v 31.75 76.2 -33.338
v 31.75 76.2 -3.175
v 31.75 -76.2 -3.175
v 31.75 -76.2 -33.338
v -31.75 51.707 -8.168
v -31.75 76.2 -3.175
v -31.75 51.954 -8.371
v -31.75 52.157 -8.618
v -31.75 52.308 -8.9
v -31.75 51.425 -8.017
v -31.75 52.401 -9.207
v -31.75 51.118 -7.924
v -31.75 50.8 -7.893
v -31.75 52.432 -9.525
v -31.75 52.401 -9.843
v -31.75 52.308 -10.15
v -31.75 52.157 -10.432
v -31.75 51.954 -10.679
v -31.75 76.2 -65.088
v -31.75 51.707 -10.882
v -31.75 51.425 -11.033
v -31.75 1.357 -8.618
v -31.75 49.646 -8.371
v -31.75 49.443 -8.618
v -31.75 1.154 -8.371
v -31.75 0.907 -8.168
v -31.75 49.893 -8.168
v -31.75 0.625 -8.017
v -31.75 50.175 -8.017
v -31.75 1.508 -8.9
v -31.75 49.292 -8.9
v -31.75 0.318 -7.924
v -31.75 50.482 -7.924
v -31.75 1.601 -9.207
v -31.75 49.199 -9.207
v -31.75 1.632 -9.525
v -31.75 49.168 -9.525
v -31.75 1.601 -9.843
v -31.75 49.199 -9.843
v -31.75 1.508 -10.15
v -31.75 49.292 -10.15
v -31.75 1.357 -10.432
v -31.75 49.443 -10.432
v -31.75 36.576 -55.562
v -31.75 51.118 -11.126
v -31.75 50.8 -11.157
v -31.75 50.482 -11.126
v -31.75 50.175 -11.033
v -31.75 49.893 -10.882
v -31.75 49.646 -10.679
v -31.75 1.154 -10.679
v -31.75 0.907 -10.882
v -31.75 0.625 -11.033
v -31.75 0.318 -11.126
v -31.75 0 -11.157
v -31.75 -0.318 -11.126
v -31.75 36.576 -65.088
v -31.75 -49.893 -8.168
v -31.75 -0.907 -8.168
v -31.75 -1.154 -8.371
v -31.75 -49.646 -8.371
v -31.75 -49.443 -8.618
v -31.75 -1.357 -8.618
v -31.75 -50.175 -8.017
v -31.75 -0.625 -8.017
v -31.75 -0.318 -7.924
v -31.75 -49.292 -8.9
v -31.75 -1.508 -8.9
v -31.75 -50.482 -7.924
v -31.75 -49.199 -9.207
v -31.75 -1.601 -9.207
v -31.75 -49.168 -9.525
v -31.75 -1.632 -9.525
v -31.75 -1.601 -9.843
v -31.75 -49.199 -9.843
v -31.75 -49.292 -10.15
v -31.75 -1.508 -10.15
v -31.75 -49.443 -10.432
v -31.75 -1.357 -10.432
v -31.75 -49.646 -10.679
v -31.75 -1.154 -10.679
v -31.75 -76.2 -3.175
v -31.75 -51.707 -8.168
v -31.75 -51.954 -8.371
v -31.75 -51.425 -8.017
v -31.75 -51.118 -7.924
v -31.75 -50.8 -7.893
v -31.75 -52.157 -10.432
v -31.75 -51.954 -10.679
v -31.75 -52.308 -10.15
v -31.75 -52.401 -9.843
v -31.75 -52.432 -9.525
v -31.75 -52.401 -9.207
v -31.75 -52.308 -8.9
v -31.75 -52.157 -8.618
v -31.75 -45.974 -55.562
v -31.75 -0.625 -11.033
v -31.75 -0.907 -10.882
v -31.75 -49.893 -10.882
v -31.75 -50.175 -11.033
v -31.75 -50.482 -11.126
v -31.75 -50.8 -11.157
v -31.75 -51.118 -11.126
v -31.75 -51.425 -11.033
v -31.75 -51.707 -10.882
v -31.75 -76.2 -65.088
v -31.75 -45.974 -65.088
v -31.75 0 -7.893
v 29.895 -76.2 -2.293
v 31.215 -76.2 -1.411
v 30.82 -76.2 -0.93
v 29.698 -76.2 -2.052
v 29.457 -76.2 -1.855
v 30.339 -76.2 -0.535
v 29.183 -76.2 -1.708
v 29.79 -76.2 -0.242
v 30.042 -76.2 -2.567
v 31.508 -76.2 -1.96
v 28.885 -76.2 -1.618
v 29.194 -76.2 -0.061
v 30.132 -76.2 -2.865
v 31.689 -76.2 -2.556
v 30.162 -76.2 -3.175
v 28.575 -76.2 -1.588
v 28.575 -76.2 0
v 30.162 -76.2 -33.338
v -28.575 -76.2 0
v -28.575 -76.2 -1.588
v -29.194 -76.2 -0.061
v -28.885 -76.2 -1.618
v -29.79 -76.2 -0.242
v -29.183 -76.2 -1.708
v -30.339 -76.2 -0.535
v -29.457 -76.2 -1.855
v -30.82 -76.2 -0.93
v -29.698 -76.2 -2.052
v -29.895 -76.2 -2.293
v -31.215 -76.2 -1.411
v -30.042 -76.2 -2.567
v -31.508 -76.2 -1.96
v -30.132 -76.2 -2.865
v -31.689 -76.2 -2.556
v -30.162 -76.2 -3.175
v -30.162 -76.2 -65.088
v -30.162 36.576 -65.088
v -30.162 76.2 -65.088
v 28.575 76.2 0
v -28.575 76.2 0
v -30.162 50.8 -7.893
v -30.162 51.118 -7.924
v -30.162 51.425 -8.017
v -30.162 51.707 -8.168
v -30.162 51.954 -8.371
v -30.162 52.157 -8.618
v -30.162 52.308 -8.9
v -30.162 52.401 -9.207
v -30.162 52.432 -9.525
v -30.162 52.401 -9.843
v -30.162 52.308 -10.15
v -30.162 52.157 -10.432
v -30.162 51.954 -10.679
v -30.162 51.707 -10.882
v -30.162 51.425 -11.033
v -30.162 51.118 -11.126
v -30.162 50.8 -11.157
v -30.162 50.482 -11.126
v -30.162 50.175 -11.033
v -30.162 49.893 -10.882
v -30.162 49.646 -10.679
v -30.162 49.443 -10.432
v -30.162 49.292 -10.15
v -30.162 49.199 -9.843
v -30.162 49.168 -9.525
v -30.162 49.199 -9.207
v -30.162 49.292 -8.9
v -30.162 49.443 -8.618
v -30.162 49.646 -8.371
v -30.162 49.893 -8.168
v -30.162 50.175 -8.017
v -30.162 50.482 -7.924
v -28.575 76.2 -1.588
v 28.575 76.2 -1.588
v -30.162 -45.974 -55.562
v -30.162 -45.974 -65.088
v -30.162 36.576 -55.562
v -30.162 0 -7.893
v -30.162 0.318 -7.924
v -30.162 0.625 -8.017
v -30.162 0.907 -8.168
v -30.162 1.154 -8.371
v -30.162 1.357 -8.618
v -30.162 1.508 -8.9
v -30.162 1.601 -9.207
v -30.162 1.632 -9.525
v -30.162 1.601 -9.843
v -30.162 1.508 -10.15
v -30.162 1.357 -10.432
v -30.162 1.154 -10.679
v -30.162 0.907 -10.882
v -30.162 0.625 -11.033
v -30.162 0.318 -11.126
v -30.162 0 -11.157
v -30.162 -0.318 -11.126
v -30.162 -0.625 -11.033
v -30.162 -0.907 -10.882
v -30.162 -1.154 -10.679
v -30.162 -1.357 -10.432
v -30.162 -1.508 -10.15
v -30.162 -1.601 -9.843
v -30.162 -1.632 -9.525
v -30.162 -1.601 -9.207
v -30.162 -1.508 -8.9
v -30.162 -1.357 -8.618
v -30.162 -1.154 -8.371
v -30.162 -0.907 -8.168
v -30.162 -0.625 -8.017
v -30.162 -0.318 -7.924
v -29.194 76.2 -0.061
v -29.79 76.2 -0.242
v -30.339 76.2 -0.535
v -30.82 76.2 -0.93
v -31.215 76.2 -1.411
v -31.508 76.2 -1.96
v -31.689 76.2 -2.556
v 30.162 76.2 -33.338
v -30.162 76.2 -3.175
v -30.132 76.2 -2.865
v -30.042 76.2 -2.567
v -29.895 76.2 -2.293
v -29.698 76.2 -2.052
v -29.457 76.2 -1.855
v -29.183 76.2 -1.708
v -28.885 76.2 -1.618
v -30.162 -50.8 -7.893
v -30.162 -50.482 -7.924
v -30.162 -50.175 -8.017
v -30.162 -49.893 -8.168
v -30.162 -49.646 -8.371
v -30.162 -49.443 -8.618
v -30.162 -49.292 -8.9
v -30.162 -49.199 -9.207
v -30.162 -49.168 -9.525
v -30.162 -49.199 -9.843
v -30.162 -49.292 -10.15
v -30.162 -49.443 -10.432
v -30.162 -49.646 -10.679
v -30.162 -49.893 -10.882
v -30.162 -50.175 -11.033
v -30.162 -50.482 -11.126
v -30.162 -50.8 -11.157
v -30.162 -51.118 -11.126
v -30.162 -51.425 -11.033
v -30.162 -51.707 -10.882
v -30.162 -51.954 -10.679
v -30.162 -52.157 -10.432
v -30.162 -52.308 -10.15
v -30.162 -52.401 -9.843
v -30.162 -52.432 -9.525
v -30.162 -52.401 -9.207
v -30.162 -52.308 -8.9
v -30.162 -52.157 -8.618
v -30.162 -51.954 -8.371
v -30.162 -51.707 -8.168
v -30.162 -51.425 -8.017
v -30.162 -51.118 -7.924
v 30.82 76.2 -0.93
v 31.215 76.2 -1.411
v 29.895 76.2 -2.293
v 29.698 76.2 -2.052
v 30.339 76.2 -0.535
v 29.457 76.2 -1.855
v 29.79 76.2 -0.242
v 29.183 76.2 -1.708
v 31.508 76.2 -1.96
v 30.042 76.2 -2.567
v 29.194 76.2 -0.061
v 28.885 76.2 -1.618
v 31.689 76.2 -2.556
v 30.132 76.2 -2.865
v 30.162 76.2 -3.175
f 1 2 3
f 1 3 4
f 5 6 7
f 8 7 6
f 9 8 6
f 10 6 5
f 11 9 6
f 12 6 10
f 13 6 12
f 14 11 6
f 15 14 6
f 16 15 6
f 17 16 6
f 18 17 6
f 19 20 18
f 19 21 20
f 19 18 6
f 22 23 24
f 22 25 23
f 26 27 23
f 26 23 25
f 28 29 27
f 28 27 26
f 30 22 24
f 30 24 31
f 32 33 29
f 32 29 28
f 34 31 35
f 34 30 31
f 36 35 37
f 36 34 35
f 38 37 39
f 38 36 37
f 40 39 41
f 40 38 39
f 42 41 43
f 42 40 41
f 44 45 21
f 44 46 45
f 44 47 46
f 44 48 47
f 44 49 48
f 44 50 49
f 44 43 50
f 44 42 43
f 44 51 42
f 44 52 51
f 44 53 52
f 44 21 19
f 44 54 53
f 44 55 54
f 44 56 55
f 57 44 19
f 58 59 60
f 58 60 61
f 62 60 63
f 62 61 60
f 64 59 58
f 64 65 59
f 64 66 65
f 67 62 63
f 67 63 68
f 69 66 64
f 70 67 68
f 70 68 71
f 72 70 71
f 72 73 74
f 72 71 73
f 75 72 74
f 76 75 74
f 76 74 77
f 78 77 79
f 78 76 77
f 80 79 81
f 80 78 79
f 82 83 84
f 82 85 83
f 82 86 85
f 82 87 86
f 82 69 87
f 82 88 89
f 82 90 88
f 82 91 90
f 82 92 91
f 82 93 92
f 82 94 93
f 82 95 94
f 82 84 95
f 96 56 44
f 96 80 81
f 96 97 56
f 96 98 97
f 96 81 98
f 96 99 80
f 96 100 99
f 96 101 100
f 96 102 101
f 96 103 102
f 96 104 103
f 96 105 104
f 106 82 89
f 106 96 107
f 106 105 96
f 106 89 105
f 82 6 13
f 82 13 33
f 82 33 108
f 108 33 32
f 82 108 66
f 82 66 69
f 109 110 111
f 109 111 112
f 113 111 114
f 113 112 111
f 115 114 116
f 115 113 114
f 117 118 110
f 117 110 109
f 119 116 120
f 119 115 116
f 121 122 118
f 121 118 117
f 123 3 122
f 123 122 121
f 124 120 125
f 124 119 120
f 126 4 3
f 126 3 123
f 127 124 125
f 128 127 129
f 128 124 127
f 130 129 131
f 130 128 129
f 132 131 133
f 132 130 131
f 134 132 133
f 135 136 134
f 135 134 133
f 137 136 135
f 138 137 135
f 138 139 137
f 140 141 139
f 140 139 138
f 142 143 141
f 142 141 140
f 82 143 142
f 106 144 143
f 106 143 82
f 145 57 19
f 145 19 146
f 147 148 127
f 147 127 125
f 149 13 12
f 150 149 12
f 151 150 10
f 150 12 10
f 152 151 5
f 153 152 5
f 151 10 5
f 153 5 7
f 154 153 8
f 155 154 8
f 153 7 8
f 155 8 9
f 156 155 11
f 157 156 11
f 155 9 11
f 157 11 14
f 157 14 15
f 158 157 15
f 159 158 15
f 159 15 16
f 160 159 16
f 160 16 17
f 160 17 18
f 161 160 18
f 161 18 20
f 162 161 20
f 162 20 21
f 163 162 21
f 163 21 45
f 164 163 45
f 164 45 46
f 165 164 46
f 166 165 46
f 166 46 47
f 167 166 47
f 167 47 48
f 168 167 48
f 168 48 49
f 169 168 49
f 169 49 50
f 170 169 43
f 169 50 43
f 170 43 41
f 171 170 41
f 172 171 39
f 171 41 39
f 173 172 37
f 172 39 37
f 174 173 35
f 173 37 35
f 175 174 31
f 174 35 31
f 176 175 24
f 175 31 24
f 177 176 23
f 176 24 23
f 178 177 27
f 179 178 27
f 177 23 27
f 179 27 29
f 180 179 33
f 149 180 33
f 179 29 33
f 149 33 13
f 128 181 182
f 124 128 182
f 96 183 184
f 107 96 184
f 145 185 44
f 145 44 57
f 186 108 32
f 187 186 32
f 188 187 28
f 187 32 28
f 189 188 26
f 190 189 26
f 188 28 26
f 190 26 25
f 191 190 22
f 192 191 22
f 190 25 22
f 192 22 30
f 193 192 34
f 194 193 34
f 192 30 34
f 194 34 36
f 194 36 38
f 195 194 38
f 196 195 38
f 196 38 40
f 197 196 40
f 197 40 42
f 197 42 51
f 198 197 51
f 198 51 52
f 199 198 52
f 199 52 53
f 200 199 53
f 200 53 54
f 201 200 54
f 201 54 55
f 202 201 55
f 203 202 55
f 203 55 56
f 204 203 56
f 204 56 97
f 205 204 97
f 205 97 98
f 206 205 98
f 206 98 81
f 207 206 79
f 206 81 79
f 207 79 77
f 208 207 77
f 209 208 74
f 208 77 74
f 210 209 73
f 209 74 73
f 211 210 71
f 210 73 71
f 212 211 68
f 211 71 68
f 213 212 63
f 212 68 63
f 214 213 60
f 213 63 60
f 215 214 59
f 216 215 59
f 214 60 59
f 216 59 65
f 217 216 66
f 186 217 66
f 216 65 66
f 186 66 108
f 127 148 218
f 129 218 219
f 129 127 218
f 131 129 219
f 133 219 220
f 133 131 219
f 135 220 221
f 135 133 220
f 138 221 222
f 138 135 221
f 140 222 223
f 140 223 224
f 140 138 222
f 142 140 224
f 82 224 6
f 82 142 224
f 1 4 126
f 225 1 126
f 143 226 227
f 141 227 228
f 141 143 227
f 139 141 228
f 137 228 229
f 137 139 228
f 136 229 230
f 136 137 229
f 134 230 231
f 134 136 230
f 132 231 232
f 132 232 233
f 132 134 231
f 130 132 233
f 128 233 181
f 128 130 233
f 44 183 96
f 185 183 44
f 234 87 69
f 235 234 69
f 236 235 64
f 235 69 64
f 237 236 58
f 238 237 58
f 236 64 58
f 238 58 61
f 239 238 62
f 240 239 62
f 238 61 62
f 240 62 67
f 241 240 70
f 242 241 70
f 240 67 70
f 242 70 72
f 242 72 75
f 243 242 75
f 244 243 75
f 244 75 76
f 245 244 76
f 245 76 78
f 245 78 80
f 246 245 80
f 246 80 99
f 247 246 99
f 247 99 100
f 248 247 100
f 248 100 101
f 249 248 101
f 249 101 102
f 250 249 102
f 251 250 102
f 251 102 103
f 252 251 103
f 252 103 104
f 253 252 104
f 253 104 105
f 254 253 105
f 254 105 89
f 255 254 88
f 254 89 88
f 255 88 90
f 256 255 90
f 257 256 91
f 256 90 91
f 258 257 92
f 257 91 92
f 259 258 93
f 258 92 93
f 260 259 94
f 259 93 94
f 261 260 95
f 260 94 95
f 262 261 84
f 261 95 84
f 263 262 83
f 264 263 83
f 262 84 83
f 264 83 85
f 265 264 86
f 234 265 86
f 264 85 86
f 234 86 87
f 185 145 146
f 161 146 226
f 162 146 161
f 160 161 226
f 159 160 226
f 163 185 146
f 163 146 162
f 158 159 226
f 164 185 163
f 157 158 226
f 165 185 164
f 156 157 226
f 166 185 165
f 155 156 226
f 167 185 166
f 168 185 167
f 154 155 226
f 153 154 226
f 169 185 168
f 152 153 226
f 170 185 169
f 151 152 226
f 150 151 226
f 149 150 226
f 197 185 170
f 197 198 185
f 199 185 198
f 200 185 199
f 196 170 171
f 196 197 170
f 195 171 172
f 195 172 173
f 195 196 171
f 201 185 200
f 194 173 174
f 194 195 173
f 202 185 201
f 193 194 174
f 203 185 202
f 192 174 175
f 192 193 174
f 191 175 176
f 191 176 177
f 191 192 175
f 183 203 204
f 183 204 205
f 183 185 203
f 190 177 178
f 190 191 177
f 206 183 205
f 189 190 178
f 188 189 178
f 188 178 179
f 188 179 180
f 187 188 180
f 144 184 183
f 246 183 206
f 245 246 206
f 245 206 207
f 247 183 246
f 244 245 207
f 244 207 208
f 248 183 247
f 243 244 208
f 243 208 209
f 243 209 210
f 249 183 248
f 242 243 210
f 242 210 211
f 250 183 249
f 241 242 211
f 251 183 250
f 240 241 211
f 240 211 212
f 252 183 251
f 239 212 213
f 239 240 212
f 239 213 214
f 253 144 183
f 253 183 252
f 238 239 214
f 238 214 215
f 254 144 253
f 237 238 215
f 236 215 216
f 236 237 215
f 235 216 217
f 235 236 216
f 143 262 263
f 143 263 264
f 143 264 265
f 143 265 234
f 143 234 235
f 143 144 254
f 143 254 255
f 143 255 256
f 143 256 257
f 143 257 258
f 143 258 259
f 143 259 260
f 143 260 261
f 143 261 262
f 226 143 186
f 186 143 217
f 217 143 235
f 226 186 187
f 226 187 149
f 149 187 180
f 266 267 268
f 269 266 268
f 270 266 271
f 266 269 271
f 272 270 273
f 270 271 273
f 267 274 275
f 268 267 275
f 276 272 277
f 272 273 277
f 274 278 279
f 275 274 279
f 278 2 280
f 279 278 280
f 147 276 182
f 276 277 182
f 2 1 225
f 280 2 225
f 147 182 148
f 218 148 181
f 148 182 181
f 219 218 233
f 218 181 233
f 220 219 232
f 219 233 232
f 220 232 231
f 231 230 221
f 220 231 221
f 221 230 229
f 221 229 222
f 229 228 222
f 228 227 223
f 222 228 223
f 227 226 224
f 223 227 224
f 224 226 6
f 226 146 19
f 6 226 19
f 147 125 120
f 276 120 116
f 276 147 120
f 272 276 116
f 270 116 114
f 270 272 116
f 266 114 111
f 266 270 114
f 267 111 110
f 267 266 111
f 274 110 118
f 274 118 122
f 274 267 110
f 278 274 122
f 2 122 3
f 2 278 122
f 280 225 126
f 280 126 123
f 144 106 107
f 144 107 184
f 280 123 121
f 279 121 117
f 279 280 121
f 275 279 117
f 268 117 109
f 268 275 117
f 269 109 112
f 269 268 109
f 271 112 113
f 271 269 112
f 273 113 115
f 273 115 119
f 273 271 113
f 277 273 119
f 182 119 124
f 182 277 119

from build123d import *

# Parameters (mm, degrees)
SKETCH1_W                    = 63.5
SKETCH1_H                    = 152.4
BASE_FLANGE1_DEPTH           = 1.5875
EDGE_FLANGE1_STRIP_W         = 9.525
EDGE_FLANGE1_STRIP_H         = 1.5875
EDGE_FLANGE1_STRIP_CUT_DEPTH = 152.4
EDGE_FLANGE1_DEPTH           = 152.4
EDGE_FLANGE2_STRIP_W         = 9.525
EDGE_FLANGE2_STRIP_H         = 1.5875
EDGE_FLANGE2_STRIP_CUT_DEPTH = 152.4
EDGE_FLANGE2_DEPTH           = 152.4
F_4_CLEARANCE_HOLE1_REACH    = 120.638
F_4_CLEARANCE_HOLE1_BORE_R   = 1.63195
SKETCH16_W                   = 9.525
SKETCH16_H                   = 82.55
CUT_EXTRUDE1_DEPTH           = 118.796351015


# Sheet-metal steps are written as plain solids
with BuildPart() as part:
    # Sketch1 → Base-Flange1 (new body)
    with BuildSketch(Plane.XY):
        Rectangle(SKETCH1_W, SKETCH1_H)
    extrude(amount=-BASE_FLANGE1_DEPTH)

    # Edge-Flange1 strip (across the edge) → Edge-Flange1 strip cut (cut)
    with BuildSketch(Plane(origin=(31.75, 76.2, -1.5875), x_dir=(-1, 0, 0), z_dir=(0, -1, 0))):
        with Locations((-1.5875, -0.79375)):
            Rectangle(EDGE_FLANGE1_STRIP_W, EDGE_FLANGE1_STRIP_H)
    extrude(amount=EDGE_FLANGE1_STRIP_CUT_DEPTH, mode=Mode.SUBTRACT)

    # Edge-Flange1 section (across the edge) → Edge-Flange1 (add)
    with BuildSketch(Plane(origin=(31.75, 76.2, -1.5875), x_dir=(-1, 0, 0), z_dir=(0, -1, 0))):
        with BuildLine():
            Line((0, 1.5875), (0, 31.75))
            Line((0, 31.75), (1.5875, 31.75))
            Line((1.5875, 31.75), (1.5875, 1.5875))
            ThreePointArc((1.5875, 1.5875), (2.052467985, 0.464967985), (3.175, 0))
            Line((3.175, 0), (3.175, -1.5875))
            ThreePointArc((3.175, -1.5875), (0.92993597, -0.65756403), (0, 1.5875))
        make_face()
    extrude(amount=EDGE_FLANGE1_DEPTH)

    # Edge-Flange2 strip (across the edge) → Edge-Flange2 strip cut (cut)
    with BuildSketch(Plane(origin=(-31.75, -76.2, -1.5875), x_dir=(1, 0, 0), z_dir=(0, 1, 0))):
        with Locations((-1.5875, -0.79375)):
            Rectangle(EDGE_FLANGE2_STRIP_W, EDGE_FLANGE2_STRIP_H)
    extrude(amount=EDGE_FLANGE2_STRIP_CUT_DEPTH, mode=Mode.SUBTRACT)

    # Edge-Flange2 section (across the edge) → Edge-Flange2 (add)
    with BuildSketch(Plane(origin=(-31.75, -76.2, -1.5875), x_dir=(1, 0, 0), z_dir=(0, 1, 0))):
        with BuildLine():
            Line((0, 1.5875), (0, 63.5))
            Line((0, 63.5), (1.5875, 63.5))
            Line((1.5875, 63.5), (1.5875, 1.5875))
            ThreePointArc((1.5875, 1.5875), (2.052467985, 0.464967985), (3.175, 0))
            Line((3.175, 0), (3.175, -1.5875))
            ThreePointArc((3.175, -1.5875), (0.92993597, -0.65756403), (0, 1.5875))
        make_face()
    extrude(amount=EDGE_FLANGE2_DEPTH)

    # #4 Clearance Hole1 bore → #4 Clearance Hole1 (cut, up to next)
    with BuildSketch(Plane.ZY.offset(31.75), mode=Mode.PRIVATE) as f_4_clearance_hole1_sk1:
        with Locations((-9.525, -50.8)):
            Circle(F_4_CLEARANCE_HOLE1_BORE_R)
    f_4_clearance_hole1_tool1 = extrude(f_4_clearance_hole1_sk1.sketch, amount=-F_4_CLEARANCE_HOLE1_REACH, mode=Mode.PRIVATE) & part.part
    # #4 Clearance Hole1 bore → #4 Clearance Hole1 (cut, up to next)
    with BuildSketch(Plane.ZY.offset(31.75), mode=Mode.PRIVATE) as f_4_clearance_hole1_sk2:
        with Locations((-9.525, 0)):
            Circle(F_4_CLEARANCE_HOLE1_BORE_R)
    f_4_clearance_hole1_tool2 = extrude(f_4_clearance_hole1_sk2.sketch, amount=-F_4_CLEARANCE_HOLE1_REACH, mode=Mode.PRIVATE) & part.part
    # #4 Clearance Hole1 bore → #4 Clearance Hole1 (cut, up to next)
    with BuildSketch(Plane.ZY.offset(31.75), mode=Mode.PRIVATE) as f_4_clearance_hole1_sk3:
        with Locations((-9.525, 50.8)):
            Circle(F_4_CLEARANCE_HOLE1_BORE_R)
    f_4_clearance_hole1_tool3 = extrude(f_4_clearance_hole1_sk3.sketch, amount=-F_4_CLEARANCE_HOLE1_REACH, mode=Mode.PRIVATE) & part.part
    add(f_4_clearance_hole1_tool1.solids().sort_by_distance((-31.75, -50.8, -9.525))[0], mode=Mode.SUBTRACT)
    add(f_4_clearance_hole1_tool2.solids().sort_by_distance((-31.75, 0, -9.525))[0], mode=Mode.SUBTRACT)
    add(f_4_clearance_hole1_tool3.solids().sort_by_distance((-31.75, 50.8, -9.525))[0], mode=Mode.SUBTRACT)

    # Sketch16 → Cut-Extrude1 (cut, through all)
    with BuildSketch(Plane(origin=(-30.1625, 0, 0), x_dir=(0, 0, -1), z_dir=(1, 0, 0))):
        with Locations((60.325, -4.699)):
            Rectangle(SKETCH16_W, SKETCH16_H)
    extrude(amount=-CUT_EXTRUDE1_DEPTH, mode=Mode.SUBTRACT)


solid = part.part
